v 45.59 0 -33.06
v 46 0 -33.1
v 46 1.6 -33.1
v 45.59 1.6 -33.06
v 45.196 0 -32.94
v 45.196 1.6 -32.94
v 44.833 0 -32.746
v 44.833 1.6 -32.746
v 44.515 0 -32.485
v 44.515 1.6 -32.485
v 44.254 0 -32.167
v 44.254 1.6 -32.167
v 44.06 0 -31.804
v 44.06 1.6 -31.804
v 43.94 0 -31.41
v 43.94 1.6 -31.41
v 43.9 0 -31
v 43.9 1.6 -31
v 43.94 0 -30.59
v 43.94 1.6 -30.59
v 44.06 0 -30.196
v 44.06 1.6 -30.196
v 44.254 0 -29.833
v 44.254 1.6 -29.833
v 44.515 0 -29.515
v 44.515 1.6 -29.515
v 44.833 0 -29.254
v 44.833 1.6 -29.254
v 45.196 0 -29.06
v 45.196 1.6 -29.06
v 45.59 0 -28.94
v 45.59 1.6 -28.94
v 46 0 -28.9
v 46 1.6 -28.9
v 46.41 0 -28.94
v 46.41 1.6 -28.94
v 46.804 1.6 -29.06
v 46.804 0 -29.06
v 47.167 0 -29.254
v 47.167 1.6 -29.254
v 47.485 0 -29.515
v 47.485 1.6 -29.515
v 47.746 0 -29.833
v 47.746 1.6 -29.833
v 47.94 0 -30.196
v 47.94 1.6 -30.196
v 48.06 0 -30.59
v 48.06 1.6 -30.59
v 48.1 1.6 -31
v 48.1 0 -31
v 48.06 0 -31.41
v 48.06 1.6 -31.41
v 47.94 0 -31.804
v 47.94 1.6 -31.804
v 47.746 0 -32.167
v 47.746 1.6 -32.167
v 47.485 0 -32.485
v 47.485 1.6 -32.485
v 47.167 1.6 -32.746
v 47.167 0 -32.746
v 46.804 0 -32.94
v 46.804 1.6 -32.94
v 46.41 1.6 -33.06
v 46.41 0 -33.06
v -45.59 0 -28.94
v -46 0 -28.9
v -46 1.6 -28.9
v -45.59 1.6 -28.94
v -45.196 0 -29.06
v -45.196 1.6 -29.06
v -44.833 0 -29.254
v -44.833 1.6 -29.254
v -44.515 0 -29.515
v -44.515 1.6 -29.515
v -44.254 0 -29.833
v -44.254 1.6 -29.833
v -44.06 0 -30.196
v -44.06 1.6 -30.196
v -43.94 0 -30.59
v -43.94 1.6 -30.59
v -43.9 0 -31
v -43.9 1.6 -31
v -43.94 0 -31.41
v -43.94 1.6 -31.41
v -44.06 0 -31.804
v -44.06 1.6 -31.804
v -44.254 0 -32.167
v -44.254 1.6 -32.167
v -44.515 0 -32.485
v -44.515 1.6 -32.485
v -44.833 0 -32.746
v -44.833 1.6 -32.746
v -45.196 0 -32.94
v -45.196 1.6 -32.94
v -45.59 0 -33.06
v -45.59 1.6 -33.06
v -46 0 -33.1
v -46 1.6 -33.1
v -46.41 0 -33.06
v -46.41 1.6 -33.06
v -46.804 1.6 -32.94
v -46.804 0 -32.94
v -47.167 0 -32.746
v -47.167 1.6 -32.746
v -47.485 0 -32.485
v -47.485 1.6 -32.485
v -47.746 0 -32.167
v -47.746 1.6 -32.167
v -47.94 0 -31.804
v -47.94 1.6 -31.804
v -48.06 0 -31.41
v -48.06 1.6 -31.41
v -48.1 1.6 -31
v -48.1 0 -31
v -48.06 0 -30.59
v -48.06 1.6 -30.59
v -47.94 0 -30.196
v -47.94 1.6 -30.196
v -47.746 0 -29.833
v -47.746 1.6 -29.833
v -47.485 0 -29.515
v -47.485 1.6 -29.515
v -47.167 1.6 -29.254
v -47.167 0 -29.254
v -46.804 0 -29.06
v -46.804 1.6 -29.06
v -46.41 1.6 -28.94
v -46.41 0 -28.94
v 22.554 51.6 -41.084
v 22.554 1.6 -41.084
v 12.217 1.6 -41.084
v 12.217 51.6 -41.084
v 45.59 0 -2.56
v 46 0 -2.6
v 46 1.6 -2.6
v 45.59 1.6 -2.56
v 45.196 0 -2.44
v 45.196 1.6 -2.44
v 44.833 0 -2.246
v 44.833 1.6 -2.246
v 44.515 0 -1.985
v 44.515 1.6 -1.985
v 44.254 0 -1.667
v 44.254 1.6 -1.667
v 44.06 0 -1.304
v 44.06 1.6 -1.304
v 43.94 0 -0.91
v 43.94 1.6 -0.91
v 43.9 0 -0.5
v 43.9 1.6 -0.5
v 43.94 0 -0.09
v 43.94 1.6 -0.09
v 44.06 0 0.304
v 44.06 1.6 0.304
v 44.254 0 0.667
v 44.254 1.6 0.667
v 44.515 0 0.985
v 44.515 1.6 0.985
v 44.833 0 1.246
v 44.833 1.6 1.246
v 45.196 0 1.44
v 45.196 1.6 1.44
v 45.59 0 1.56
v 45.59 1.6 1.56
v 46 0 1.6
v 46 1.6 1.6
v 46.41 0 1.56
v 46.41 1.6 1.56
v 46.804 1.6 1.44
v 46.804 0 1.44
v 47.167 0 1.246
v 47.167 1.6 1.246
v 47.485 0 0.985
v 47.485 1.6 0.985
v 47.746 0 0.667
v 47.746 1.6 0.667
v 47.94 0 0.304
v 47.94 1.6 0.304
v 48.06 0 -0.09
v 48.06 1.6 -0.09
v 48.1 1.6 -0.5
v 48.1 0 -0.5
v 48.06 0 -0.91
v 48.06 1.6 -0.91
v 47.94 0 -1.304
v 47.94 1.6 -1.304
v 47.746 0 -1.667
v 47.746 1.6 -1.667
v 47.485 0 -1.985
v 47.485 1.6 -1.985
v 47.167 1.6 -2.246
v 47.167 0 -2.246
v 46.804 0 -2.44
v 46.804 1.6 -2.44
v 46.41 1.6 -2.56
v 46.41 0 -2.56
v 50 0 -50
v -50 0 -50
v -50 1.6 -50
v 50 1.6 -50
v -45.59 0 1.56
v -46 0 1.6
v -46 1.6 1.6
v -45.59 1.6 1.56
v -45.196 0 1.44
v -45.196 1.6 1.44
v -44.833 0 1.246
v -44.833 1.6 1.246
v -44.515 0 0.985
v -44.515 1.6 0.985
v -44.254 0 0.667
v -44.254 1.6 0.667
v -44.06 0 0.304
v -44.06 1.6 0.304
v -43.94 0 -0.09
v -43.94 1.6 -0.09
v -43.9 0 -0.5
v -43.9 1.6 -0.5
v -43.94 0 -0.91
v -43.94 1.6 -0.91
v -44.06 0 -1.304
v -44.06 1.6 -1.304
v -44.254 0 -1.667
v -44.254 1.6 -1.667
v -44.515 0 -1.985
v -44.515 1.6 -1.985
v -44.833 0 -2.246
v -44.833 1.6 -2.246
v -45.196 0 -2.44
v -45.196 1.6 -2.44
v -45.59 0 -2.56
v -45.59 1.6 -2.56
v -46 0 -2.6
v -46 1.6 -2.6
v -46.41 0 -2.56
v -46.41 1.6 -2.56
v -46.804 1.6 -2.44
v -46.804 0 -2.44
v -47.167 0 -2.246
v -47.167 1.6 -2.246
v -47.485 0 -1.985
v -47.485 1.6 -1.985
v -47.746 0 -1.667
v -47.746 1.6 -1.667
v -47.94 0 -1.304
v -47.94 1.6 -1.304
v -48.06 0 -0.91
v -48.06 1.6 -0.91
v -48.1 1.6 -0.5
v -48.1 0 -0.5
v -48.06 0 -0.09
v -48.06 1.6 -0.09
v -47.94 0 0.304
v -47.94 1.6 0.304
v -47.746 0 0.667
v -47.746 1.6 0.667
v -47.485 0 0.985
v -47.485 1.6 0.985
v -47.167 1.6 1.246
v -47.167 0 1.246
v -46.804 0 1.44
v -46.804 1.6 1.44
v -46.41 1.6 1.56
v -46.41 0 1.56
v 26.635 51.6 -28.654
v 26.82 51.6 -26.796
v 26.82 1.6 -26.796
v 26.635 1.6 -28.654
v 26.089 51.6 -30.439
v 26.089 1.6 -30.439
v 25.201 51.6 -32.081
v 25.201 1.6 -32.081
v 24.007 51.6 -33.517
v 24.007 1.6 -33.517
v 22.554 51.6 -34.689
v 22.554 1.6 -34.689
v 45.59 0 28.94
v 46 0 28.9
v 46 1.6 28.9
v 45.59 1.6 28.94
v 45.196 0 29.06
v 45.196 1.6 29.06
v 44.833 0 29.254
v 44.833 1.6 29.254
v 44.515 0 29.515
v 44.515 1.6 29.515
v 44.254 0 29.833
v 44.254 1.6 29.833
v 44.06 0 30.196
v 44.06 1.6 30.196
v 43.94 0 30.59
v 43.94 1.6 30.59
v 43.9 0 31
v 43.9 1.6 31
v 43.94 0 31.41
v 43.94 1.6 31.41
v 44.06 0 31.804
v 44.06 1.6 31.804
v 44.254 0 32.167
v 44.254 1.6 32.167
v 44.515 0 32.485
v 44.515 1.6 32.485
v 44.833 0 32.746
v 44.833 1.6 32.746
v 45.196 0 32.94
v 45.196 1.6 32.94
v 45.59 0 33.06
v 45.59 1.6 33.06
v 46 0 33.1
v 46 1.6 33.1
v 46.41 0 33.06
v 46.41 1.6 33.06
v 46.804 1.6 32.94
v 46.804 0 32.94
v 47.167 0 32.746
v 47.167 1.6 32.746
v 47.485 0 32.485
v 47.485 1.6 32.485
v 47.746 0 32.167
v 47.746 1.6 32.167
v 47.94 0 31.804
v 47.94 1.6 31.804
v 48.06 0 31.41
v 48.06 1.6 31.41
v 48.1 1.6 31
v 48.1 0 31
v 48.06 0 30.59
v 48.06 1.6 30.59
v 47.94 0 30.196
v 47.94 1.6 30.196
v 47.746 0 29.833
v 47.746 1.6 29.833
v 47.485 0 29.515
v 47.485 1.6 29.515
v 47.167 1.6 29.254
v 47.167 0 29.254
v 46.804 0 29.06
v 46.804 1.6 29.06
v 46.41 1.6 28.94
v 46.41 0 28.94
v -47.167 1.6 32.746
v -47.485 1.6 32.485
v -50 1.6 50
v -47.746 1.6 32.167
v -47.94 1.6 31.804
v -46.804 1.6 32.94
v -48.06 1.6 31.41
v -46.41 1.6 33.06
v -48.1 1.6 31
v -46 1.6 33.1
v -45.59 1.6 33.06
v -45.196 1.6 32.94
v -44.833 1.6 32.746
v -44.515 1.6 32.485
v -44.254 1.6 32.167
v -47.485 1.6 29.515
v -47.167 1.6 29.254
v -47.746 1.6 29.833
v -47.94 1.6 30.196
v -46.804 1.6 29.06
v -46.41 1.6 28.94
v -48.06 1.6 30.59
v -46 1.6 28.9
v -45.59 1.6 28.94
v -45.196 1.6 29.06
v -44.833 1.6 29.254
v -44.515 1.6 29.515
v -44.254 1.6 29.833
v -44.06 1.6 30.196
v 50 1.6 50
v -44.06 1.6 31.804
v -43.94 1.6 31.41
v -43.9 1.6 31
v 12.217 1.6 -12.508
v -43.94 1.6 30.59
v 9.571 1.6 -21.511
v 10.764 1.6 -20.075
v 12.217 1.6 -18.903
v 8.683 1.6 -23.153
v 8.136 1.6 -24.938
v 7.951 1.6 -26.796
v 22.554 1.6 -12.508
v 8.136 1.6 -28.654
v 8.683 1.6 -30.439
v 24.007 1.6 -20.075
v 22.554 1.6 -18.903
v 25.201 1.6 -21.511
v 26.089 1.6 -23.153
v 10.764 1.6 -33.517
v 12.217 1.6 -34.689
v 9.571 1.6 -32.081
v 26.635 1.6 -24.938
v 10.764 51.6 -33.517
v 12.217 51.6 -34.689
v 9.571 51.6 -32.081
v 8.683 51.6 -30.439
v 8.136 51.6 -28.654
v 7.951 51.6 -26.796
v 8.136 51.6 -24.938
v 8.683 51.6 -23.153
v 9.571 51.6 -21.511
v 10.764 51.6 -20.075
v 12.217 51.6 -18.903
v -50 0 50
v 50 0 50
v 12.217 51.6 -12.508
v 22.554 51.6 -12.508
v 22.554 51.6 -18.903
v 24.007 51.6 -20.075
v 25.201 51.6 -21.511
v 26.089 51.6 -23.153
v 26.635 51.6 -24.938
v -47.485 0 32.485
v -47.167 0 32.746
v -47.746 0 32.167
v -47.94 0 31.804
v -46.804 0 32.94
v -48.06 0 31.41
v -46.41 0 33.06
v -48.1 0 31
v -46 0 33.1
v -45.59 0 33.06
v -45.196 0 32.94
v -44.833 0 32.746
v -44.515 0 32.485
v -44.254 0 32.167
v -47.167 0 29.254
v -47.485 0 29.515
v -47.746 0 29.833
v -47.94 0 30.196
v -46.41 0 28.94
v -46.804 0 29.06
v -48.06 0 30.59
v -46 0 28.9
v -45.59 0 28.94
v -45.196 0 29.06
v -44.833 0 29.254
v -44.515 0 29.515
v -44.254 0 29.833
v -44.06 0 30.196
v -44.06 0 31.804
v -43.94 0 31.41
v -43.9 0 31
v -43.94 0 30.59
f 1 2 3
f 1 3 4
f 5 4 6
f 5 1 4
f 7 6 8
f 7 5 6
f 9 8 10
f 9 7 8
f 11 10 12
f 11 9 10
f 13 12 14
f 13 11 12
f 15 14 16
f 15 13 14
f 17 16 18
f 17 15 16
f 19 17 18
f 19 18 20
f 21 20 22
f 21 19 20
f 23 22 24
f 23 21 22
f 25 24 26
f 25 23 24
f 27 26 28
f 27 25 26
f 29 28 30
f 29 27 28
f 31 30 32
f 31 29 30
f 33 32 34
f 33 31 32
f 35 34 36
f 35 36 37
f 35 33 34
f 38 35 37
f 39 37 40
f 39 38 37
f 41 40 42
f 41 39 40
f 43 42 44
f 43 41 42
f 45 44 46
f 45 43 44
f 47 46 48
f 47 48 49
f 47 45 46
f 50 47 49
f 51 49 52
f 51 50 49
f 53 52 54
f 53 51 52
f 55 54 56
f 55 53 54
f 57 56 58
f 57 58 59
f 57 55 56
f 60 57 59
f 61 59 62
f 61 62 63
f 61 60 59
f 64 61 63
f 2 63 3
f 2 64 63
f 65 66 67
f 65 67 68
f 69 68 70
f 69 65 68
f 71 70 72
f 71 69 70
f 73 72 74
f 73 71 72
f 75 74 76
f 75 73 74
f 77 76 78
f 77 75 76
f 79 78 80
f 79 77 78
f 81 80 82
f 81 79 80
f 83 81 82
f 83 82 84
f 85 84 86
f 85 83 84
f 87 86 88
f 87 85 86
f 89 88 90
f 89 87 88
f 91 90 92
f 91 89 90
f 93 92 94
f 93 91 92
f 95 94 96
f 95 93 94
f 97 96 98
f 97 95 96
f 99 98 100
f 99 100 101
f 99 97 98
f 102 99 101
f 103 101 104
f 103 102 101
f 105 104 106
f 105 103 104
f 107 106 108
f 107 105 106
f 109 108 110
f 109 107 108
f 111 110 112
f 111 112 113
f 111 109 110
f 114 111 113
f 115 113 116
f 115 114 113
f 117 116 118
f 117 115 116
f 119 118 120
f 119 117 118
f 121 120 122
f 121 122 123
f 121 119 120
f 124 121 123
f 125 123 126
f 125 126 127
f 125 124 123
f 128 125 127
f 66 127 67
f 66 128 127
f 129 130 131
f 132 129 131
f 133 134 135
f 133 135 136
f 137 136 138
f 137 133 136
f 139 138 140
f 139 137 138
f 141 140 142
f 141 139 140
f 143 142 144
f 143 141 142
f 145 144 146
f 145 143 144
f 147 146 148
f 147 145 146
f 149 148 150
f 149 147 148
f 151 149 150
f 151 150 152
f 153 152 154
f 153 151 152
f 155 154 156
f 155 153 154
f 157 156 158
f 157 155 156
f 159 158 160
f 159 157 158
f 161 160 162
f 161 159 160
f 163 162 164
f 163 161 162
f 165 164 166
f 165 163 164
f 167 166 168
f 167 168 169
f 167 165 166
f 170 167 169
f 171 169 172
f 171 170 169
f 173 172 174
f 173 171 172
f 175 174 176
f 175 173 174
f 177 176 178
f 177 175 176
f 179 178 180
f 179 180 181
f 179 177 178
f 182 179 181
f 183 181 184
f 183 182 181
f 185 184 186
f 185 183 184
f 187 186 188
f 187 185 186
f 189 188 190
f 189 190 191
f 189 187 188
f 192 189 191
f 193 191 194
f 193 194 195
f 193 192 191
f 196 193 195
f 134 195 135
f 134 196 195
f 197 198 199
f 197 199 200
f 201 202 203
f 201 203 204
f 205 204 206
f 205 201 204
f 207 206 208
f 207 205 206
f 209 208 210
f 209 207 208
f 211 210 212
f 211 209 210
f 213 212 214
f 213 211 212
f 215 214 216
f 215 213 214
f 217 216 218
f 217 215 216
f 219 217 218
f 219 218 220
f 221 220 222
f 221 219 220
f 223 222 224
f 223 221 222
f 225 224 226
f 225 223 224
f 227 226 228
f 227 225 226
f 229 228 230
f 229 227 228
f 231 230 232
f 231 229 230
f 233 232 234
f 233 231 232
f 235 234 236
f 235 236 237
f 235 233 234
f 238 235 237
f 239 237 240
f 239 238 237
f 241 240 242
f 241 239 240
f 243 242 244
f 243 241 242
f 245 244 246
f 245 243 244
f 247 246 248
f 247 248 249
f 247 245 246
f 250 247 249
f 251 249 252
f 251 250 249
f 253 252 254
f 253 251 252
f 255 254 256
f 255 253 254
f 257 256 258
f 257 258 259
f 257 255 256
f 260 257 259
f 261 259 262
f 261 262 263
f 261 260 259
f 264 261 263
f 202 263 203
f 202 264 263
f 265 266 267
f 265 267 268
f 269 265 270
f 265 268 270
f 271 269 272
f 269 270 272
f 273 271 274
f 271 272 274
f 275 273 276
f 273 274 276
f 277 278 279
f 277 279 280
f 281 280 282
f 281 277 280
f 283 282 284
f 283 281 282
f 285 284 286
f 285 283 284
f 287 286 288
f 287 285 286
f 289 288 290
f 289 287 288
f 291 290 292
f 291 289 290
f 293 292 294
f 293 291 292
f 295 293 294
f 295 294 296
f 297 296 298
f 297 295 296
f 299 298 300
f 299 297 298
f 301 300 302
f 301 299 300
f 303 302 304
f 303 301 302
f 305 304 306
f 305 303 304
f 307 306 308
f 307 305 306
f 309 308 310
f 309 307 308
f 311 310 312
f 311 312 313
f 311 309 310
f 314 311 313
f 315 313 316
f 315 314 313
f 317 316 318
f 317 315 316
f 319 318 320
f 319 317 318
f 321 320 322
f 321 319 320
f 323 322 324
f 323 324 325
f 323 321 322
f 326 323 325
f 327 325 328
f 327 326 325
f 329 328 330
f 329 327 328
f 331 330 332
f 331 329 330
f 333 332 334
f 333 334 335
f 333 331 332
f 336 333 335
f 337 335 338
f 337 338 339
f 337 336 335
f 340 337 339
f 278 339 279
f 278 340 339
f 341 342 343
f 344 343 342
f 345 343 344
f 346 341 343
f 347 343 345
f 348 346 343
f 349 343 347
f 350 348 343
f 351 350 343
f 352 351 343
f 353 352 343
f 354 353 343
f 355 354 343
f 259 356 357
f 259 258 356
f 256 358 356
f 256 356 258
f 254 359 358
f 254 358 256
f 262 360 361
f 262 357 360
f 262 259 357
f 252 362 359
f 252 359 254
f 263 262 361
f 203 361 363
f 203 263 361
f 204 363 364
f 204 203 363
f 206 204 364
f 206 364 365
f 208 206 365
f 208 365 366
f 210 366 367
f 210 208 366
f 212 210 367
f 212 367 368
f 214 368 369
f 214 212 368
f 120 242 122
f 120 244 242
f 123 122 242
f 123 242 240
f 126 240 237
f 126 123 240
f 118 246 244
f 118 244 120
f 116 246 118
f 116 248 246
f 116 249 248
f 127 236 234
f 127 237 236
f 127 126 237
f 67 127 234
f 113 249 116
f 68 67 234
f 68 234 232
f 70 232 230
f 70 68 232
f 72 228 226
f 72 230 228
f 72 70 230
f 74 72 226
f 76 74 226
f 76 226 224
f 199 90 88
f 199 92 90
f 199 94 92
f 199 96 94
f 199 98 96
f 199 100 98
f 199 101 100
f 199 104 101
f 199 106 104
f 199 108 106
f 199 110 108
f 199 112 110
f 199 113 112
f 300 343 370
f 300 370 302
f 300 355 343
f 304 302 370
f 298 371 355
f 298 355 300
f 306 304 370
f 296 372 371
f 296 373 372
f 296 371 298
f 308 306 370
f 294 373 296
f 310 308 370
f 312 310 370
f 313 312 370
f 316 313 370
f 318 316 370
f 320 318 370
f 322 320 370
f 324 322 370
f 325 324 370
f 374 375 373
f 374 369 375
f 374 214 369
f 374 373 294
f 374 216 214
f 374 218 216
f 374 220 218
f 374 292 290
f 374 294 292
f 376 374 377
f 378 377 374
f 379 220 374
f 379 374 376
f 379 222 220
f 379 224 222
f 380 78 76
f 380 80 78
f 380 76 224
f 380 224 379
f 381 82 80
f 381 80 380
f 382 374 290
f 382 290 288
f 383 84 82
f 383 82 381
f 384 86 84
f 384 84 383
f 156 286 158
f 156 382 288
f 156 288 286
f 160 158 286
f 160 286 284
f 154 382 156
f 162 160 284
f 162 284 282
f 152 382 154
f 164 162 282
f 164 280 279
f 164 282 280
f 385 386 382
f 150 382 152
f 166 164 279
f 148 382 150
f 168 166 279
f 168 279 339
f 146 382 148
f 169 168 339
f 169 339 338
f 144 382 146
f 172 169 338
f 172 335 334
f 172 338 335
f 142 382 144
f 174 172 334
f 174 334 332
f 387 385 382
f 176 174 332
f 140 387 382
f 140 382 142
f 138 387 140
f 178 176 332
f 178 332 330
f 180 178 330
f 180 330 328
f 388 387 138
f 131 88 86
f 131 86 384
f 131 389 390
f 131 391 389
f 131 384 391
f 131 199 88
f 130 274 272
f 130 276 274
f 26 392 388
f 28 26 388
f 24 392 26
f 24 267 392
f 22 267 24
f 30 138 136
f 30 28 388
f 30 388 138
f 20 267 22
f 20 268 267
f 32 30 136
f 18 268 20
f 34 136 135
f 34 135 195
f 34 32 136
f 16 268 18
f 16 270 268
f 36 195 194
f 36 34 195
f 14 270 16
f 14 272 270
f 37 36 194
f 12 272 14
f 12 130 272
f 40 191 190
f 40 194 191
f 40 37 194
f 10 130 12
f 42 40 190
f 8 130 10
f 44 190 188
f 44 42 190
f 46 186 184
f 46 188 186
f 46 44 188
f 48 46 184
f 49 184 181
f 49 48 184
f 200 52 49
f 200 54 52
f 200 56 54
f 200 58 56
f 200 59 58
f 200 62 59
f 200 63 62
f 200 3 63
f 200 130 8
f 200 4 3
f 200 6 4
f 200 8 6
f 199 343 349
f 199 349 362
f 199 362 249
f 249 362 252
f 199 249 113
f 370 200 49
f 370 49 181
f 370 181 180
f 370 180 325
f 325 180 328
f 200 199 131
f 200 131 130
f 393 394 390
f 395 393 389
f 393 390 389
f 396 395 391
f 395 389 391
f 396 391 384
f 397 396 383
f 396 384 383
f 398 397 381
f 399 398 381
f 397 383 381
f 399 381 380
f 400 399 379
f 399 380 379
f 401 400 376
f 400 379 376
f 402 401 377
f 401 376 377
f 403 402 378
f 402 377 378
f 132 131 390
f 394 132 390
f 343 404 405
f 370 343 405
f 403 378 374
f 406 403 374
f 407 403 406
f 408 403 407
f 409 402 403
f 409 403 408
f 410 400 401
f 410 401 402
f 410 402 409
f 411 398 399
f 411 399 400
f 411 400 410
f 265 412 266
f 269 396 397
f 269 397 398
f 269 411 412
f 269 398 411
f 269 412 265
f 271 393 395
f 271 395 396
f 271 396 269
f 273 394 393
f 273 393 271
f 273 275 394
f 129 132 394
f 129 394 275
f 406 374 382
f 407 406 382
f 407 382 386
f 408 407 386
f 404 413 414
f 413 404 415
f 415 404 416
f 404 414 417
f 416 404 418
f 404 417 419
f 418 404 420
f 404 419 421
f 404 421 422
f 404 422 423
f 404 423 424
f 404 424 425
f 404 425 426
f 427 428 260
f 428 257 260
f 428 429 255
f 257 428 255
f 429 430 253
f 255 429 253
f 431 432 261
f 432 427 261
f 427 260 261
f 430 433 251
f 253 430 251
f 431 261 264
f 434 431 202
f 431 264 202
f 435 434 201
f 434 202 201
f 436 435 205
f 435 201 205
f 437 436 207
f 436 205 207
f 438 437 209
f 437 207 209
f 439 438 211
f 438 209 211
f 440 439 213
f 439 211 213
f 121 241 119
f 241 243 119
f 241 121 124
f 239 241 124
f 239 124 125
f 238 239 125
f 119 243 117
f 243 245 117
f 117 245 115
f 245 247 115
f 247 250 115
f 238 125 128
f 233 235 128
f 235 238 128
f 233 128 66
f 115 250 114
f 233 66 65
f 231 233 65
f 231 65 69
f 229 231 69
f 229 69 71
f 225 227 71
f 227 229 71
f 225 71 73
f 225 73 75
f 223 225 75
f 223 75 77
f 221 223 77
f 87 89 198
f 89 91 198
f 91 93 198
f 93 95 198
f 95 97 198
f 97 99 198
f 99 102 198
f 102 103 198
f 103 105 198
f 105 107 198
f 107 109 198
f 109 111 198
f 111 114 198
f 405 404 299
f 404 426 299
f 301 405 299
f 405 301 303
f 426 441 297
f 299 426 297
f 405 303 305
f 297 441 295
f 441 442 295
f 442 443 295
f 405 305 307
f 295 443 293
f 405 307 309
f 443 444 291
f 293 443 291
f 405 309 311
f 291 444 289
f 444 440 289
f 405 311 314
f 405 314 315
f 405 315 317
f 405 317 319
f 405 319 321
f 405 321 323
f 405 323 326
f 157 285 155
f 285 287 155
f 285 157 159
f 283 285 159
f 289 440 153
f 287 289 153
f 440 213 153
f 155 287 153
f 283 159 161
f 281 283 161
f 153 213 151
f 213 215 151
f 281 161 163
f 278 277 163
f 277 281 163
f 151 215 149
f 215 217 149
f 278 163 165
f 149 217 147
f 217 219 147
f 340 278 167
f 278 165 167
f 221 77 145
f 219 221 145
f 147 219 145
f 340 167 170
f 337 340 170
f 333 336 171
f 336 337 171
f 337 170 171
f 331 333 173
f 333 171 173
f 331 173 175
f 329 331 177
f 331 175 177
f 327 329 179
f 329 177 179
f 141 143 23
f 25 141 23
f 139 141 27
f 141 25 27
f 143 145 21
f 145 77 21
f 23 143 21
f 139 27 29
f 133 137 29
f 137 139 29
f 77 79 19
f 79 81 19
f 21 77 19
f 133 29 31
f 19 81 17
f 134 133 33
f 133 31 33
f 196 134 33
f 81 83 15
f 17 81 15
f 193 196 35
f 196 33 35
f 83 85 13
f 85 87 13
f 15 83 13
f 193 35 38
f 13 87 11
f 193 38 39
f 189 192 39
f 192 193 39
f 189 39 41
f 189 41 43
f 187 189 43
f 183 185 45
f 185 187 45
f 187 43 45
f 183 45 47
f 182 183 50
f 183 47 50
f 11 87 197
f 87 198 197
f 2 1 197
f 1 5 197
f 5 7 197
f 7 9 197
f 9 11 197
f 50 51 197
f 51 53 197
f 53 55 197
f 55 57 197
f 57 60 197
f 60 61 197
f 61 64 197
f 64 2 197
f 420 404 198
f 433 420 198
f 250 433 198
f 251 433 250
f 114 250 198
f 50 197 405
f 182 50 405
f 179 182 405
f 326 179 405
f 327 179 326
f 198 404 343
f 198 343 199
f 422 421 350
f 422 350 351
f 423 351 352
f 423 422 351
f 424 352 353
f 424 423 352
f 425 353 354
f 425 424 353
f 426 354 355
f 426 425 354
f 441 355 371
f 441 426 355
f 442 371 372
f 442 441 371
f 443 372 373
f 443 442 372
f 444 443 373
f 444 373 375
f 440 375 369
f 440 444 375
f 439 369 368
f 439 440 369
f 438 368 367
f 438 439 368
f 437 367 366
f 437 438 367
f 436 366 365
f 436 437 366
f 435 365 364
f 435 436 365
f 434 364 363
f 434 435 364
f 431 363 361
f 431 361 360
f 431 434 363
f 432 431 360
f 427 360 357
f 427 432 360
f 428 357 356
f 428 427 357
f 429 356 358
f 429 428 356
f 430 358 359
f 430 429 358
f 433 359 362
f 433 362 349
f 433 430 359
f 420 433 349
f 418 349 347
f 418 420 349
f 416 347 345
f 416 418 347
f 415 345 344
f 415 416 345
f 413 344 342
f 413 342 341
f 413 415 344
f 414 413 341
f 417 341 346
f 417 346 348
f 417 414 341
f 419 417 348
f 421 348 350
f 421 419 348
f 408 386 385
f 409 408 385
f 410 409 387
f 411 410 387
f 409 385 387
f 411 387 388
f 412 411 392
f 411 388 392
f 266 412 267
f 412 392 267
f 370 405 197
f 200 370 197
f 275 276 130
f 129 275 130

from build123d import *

# Parameters (mm, degrees)
CROQUIS1_W              = 100
CROQUIS1_H              = 100
CROQUIS1_R              = 2.1
SALIENTE_EXTRUIR1_DEPTH = 1.6
SALIENTE_EXTRUIR2_DEPTH = 50


with BuildPart() as part:
    # Croquis1 → Saliente-Extruir1 (new body)
    with BuildSketch(Plane(origin=(0, 0, 0), x_dir=(1, 0, 0), z_dir=(0, 1, 0))):
        Rectangle(CROQUIS1_W, CROQUIS1_H)
        with Locations(Location((-46, 31, 0), (0, 0, 270))):
            Circle(CROQUIS1_R, mode=Mode.SUBTRACT)
        with Locations(Location((-46, 0.5, 0), (0, 0, 270))):
            Circle(CROQUIS1_R, mode=Mode.SUBTRACT)
        with Locations(Location((-46, -31, 0), (0, 0, 270))):
            Circle(CROQUIS1_R, mode=Mode.SUBTRACT)
        with Locations(Location((46, -31, 0), (0, 0, 90))):
            Circle(CROQUIS1_R, mode=Mode.SUBTRACT)
        with Locations(Location((46, 0.5, 0), (0, 0, 90))):
            Circle(CROQUIS1_R, mode=Mode.SUBTRACT)
        with Locations(Location((46, 31, 0), (0, 0, 90))):
            Circle(CROQUIS1_R, mode=Mode.SUBTRACT)
    extrude(amount=SALIENTE_EXTRUIR1_DEPTH)

    # Croquis2 → Saliente-Extruir2 (add)
    with BuildSketch(Plane(origin=(0, 1.6, 0), x_dir=(1, 0, 0), z_dir=(0, 1, 0))):
        with BuildLine():
            Line((12.217414709, 18.903028856), (12.217414709, 34.689006191))
            ThreePointArc((12.217414709, 34.689006191), (7.951157107, 26.796017524), (12.217414709, 18.903028856))
        make_face()
        with BuildLine():
            ThreePointArc((22.553948572, 34.689006191), (17.38568164, 36.230542057), (12.217414709, 34.689006191))
            Line((12.217414709, 34.689006191), (12.217414709, 18.903028856))
            ThreePointArc((12.217414709, 18.903028856), (17.38568164, 17.36149299), (22.553948572, 18.903028856))
            Line((22.553948572, 18.903028856), (22.553948572, 34.689006191))
        make_face()
        with BuildLine():
            Line((22.553948572, 41.084489345), (12.217414709, 41.084489345))
            Line((12.217414709, 41.084489345), (12.217414709, 34.689006191))
            ThreePointArc((12.217414709, 34.689006191), (17.38568164, 36.230542057), (22.553948572, 34.689006191))
            Line((22.553948572, 34.689006191), (22.553948572, 41.084489345))
        make_face()
        with BuildLine():
            ThreePointArc((26.820206174, 26.796017524), (25.685392308, 31.282113377), (22.553948572, 34.689006191))
            Line((22.553948572, 34.689006191), (22.553948572, 18.903028856))
            ThreePointArc((22.553948572, 18.903028856), (25.685392308, 22.30992167), (26.820206174, 26.796017524))
        make_face()
        with BuildLine():
            ThreePointArc((22.553948572, 18.903028856), (17.38568164, 17.36149299), (12.217414709, 18.903028856))
            Line((12.217414709, 18.903028856), (12.217414709, 12.507545702))
            Line((12.217414709, 12.507545702), (22.553948572, 12.507545702))
            Line((22.553948572, 12.507545702), (22.553948572, 18.903028856))
        make_face()
    extrude(amount=SALIENTE_EXTRUIR2_DEPTH)


solid = part.part
